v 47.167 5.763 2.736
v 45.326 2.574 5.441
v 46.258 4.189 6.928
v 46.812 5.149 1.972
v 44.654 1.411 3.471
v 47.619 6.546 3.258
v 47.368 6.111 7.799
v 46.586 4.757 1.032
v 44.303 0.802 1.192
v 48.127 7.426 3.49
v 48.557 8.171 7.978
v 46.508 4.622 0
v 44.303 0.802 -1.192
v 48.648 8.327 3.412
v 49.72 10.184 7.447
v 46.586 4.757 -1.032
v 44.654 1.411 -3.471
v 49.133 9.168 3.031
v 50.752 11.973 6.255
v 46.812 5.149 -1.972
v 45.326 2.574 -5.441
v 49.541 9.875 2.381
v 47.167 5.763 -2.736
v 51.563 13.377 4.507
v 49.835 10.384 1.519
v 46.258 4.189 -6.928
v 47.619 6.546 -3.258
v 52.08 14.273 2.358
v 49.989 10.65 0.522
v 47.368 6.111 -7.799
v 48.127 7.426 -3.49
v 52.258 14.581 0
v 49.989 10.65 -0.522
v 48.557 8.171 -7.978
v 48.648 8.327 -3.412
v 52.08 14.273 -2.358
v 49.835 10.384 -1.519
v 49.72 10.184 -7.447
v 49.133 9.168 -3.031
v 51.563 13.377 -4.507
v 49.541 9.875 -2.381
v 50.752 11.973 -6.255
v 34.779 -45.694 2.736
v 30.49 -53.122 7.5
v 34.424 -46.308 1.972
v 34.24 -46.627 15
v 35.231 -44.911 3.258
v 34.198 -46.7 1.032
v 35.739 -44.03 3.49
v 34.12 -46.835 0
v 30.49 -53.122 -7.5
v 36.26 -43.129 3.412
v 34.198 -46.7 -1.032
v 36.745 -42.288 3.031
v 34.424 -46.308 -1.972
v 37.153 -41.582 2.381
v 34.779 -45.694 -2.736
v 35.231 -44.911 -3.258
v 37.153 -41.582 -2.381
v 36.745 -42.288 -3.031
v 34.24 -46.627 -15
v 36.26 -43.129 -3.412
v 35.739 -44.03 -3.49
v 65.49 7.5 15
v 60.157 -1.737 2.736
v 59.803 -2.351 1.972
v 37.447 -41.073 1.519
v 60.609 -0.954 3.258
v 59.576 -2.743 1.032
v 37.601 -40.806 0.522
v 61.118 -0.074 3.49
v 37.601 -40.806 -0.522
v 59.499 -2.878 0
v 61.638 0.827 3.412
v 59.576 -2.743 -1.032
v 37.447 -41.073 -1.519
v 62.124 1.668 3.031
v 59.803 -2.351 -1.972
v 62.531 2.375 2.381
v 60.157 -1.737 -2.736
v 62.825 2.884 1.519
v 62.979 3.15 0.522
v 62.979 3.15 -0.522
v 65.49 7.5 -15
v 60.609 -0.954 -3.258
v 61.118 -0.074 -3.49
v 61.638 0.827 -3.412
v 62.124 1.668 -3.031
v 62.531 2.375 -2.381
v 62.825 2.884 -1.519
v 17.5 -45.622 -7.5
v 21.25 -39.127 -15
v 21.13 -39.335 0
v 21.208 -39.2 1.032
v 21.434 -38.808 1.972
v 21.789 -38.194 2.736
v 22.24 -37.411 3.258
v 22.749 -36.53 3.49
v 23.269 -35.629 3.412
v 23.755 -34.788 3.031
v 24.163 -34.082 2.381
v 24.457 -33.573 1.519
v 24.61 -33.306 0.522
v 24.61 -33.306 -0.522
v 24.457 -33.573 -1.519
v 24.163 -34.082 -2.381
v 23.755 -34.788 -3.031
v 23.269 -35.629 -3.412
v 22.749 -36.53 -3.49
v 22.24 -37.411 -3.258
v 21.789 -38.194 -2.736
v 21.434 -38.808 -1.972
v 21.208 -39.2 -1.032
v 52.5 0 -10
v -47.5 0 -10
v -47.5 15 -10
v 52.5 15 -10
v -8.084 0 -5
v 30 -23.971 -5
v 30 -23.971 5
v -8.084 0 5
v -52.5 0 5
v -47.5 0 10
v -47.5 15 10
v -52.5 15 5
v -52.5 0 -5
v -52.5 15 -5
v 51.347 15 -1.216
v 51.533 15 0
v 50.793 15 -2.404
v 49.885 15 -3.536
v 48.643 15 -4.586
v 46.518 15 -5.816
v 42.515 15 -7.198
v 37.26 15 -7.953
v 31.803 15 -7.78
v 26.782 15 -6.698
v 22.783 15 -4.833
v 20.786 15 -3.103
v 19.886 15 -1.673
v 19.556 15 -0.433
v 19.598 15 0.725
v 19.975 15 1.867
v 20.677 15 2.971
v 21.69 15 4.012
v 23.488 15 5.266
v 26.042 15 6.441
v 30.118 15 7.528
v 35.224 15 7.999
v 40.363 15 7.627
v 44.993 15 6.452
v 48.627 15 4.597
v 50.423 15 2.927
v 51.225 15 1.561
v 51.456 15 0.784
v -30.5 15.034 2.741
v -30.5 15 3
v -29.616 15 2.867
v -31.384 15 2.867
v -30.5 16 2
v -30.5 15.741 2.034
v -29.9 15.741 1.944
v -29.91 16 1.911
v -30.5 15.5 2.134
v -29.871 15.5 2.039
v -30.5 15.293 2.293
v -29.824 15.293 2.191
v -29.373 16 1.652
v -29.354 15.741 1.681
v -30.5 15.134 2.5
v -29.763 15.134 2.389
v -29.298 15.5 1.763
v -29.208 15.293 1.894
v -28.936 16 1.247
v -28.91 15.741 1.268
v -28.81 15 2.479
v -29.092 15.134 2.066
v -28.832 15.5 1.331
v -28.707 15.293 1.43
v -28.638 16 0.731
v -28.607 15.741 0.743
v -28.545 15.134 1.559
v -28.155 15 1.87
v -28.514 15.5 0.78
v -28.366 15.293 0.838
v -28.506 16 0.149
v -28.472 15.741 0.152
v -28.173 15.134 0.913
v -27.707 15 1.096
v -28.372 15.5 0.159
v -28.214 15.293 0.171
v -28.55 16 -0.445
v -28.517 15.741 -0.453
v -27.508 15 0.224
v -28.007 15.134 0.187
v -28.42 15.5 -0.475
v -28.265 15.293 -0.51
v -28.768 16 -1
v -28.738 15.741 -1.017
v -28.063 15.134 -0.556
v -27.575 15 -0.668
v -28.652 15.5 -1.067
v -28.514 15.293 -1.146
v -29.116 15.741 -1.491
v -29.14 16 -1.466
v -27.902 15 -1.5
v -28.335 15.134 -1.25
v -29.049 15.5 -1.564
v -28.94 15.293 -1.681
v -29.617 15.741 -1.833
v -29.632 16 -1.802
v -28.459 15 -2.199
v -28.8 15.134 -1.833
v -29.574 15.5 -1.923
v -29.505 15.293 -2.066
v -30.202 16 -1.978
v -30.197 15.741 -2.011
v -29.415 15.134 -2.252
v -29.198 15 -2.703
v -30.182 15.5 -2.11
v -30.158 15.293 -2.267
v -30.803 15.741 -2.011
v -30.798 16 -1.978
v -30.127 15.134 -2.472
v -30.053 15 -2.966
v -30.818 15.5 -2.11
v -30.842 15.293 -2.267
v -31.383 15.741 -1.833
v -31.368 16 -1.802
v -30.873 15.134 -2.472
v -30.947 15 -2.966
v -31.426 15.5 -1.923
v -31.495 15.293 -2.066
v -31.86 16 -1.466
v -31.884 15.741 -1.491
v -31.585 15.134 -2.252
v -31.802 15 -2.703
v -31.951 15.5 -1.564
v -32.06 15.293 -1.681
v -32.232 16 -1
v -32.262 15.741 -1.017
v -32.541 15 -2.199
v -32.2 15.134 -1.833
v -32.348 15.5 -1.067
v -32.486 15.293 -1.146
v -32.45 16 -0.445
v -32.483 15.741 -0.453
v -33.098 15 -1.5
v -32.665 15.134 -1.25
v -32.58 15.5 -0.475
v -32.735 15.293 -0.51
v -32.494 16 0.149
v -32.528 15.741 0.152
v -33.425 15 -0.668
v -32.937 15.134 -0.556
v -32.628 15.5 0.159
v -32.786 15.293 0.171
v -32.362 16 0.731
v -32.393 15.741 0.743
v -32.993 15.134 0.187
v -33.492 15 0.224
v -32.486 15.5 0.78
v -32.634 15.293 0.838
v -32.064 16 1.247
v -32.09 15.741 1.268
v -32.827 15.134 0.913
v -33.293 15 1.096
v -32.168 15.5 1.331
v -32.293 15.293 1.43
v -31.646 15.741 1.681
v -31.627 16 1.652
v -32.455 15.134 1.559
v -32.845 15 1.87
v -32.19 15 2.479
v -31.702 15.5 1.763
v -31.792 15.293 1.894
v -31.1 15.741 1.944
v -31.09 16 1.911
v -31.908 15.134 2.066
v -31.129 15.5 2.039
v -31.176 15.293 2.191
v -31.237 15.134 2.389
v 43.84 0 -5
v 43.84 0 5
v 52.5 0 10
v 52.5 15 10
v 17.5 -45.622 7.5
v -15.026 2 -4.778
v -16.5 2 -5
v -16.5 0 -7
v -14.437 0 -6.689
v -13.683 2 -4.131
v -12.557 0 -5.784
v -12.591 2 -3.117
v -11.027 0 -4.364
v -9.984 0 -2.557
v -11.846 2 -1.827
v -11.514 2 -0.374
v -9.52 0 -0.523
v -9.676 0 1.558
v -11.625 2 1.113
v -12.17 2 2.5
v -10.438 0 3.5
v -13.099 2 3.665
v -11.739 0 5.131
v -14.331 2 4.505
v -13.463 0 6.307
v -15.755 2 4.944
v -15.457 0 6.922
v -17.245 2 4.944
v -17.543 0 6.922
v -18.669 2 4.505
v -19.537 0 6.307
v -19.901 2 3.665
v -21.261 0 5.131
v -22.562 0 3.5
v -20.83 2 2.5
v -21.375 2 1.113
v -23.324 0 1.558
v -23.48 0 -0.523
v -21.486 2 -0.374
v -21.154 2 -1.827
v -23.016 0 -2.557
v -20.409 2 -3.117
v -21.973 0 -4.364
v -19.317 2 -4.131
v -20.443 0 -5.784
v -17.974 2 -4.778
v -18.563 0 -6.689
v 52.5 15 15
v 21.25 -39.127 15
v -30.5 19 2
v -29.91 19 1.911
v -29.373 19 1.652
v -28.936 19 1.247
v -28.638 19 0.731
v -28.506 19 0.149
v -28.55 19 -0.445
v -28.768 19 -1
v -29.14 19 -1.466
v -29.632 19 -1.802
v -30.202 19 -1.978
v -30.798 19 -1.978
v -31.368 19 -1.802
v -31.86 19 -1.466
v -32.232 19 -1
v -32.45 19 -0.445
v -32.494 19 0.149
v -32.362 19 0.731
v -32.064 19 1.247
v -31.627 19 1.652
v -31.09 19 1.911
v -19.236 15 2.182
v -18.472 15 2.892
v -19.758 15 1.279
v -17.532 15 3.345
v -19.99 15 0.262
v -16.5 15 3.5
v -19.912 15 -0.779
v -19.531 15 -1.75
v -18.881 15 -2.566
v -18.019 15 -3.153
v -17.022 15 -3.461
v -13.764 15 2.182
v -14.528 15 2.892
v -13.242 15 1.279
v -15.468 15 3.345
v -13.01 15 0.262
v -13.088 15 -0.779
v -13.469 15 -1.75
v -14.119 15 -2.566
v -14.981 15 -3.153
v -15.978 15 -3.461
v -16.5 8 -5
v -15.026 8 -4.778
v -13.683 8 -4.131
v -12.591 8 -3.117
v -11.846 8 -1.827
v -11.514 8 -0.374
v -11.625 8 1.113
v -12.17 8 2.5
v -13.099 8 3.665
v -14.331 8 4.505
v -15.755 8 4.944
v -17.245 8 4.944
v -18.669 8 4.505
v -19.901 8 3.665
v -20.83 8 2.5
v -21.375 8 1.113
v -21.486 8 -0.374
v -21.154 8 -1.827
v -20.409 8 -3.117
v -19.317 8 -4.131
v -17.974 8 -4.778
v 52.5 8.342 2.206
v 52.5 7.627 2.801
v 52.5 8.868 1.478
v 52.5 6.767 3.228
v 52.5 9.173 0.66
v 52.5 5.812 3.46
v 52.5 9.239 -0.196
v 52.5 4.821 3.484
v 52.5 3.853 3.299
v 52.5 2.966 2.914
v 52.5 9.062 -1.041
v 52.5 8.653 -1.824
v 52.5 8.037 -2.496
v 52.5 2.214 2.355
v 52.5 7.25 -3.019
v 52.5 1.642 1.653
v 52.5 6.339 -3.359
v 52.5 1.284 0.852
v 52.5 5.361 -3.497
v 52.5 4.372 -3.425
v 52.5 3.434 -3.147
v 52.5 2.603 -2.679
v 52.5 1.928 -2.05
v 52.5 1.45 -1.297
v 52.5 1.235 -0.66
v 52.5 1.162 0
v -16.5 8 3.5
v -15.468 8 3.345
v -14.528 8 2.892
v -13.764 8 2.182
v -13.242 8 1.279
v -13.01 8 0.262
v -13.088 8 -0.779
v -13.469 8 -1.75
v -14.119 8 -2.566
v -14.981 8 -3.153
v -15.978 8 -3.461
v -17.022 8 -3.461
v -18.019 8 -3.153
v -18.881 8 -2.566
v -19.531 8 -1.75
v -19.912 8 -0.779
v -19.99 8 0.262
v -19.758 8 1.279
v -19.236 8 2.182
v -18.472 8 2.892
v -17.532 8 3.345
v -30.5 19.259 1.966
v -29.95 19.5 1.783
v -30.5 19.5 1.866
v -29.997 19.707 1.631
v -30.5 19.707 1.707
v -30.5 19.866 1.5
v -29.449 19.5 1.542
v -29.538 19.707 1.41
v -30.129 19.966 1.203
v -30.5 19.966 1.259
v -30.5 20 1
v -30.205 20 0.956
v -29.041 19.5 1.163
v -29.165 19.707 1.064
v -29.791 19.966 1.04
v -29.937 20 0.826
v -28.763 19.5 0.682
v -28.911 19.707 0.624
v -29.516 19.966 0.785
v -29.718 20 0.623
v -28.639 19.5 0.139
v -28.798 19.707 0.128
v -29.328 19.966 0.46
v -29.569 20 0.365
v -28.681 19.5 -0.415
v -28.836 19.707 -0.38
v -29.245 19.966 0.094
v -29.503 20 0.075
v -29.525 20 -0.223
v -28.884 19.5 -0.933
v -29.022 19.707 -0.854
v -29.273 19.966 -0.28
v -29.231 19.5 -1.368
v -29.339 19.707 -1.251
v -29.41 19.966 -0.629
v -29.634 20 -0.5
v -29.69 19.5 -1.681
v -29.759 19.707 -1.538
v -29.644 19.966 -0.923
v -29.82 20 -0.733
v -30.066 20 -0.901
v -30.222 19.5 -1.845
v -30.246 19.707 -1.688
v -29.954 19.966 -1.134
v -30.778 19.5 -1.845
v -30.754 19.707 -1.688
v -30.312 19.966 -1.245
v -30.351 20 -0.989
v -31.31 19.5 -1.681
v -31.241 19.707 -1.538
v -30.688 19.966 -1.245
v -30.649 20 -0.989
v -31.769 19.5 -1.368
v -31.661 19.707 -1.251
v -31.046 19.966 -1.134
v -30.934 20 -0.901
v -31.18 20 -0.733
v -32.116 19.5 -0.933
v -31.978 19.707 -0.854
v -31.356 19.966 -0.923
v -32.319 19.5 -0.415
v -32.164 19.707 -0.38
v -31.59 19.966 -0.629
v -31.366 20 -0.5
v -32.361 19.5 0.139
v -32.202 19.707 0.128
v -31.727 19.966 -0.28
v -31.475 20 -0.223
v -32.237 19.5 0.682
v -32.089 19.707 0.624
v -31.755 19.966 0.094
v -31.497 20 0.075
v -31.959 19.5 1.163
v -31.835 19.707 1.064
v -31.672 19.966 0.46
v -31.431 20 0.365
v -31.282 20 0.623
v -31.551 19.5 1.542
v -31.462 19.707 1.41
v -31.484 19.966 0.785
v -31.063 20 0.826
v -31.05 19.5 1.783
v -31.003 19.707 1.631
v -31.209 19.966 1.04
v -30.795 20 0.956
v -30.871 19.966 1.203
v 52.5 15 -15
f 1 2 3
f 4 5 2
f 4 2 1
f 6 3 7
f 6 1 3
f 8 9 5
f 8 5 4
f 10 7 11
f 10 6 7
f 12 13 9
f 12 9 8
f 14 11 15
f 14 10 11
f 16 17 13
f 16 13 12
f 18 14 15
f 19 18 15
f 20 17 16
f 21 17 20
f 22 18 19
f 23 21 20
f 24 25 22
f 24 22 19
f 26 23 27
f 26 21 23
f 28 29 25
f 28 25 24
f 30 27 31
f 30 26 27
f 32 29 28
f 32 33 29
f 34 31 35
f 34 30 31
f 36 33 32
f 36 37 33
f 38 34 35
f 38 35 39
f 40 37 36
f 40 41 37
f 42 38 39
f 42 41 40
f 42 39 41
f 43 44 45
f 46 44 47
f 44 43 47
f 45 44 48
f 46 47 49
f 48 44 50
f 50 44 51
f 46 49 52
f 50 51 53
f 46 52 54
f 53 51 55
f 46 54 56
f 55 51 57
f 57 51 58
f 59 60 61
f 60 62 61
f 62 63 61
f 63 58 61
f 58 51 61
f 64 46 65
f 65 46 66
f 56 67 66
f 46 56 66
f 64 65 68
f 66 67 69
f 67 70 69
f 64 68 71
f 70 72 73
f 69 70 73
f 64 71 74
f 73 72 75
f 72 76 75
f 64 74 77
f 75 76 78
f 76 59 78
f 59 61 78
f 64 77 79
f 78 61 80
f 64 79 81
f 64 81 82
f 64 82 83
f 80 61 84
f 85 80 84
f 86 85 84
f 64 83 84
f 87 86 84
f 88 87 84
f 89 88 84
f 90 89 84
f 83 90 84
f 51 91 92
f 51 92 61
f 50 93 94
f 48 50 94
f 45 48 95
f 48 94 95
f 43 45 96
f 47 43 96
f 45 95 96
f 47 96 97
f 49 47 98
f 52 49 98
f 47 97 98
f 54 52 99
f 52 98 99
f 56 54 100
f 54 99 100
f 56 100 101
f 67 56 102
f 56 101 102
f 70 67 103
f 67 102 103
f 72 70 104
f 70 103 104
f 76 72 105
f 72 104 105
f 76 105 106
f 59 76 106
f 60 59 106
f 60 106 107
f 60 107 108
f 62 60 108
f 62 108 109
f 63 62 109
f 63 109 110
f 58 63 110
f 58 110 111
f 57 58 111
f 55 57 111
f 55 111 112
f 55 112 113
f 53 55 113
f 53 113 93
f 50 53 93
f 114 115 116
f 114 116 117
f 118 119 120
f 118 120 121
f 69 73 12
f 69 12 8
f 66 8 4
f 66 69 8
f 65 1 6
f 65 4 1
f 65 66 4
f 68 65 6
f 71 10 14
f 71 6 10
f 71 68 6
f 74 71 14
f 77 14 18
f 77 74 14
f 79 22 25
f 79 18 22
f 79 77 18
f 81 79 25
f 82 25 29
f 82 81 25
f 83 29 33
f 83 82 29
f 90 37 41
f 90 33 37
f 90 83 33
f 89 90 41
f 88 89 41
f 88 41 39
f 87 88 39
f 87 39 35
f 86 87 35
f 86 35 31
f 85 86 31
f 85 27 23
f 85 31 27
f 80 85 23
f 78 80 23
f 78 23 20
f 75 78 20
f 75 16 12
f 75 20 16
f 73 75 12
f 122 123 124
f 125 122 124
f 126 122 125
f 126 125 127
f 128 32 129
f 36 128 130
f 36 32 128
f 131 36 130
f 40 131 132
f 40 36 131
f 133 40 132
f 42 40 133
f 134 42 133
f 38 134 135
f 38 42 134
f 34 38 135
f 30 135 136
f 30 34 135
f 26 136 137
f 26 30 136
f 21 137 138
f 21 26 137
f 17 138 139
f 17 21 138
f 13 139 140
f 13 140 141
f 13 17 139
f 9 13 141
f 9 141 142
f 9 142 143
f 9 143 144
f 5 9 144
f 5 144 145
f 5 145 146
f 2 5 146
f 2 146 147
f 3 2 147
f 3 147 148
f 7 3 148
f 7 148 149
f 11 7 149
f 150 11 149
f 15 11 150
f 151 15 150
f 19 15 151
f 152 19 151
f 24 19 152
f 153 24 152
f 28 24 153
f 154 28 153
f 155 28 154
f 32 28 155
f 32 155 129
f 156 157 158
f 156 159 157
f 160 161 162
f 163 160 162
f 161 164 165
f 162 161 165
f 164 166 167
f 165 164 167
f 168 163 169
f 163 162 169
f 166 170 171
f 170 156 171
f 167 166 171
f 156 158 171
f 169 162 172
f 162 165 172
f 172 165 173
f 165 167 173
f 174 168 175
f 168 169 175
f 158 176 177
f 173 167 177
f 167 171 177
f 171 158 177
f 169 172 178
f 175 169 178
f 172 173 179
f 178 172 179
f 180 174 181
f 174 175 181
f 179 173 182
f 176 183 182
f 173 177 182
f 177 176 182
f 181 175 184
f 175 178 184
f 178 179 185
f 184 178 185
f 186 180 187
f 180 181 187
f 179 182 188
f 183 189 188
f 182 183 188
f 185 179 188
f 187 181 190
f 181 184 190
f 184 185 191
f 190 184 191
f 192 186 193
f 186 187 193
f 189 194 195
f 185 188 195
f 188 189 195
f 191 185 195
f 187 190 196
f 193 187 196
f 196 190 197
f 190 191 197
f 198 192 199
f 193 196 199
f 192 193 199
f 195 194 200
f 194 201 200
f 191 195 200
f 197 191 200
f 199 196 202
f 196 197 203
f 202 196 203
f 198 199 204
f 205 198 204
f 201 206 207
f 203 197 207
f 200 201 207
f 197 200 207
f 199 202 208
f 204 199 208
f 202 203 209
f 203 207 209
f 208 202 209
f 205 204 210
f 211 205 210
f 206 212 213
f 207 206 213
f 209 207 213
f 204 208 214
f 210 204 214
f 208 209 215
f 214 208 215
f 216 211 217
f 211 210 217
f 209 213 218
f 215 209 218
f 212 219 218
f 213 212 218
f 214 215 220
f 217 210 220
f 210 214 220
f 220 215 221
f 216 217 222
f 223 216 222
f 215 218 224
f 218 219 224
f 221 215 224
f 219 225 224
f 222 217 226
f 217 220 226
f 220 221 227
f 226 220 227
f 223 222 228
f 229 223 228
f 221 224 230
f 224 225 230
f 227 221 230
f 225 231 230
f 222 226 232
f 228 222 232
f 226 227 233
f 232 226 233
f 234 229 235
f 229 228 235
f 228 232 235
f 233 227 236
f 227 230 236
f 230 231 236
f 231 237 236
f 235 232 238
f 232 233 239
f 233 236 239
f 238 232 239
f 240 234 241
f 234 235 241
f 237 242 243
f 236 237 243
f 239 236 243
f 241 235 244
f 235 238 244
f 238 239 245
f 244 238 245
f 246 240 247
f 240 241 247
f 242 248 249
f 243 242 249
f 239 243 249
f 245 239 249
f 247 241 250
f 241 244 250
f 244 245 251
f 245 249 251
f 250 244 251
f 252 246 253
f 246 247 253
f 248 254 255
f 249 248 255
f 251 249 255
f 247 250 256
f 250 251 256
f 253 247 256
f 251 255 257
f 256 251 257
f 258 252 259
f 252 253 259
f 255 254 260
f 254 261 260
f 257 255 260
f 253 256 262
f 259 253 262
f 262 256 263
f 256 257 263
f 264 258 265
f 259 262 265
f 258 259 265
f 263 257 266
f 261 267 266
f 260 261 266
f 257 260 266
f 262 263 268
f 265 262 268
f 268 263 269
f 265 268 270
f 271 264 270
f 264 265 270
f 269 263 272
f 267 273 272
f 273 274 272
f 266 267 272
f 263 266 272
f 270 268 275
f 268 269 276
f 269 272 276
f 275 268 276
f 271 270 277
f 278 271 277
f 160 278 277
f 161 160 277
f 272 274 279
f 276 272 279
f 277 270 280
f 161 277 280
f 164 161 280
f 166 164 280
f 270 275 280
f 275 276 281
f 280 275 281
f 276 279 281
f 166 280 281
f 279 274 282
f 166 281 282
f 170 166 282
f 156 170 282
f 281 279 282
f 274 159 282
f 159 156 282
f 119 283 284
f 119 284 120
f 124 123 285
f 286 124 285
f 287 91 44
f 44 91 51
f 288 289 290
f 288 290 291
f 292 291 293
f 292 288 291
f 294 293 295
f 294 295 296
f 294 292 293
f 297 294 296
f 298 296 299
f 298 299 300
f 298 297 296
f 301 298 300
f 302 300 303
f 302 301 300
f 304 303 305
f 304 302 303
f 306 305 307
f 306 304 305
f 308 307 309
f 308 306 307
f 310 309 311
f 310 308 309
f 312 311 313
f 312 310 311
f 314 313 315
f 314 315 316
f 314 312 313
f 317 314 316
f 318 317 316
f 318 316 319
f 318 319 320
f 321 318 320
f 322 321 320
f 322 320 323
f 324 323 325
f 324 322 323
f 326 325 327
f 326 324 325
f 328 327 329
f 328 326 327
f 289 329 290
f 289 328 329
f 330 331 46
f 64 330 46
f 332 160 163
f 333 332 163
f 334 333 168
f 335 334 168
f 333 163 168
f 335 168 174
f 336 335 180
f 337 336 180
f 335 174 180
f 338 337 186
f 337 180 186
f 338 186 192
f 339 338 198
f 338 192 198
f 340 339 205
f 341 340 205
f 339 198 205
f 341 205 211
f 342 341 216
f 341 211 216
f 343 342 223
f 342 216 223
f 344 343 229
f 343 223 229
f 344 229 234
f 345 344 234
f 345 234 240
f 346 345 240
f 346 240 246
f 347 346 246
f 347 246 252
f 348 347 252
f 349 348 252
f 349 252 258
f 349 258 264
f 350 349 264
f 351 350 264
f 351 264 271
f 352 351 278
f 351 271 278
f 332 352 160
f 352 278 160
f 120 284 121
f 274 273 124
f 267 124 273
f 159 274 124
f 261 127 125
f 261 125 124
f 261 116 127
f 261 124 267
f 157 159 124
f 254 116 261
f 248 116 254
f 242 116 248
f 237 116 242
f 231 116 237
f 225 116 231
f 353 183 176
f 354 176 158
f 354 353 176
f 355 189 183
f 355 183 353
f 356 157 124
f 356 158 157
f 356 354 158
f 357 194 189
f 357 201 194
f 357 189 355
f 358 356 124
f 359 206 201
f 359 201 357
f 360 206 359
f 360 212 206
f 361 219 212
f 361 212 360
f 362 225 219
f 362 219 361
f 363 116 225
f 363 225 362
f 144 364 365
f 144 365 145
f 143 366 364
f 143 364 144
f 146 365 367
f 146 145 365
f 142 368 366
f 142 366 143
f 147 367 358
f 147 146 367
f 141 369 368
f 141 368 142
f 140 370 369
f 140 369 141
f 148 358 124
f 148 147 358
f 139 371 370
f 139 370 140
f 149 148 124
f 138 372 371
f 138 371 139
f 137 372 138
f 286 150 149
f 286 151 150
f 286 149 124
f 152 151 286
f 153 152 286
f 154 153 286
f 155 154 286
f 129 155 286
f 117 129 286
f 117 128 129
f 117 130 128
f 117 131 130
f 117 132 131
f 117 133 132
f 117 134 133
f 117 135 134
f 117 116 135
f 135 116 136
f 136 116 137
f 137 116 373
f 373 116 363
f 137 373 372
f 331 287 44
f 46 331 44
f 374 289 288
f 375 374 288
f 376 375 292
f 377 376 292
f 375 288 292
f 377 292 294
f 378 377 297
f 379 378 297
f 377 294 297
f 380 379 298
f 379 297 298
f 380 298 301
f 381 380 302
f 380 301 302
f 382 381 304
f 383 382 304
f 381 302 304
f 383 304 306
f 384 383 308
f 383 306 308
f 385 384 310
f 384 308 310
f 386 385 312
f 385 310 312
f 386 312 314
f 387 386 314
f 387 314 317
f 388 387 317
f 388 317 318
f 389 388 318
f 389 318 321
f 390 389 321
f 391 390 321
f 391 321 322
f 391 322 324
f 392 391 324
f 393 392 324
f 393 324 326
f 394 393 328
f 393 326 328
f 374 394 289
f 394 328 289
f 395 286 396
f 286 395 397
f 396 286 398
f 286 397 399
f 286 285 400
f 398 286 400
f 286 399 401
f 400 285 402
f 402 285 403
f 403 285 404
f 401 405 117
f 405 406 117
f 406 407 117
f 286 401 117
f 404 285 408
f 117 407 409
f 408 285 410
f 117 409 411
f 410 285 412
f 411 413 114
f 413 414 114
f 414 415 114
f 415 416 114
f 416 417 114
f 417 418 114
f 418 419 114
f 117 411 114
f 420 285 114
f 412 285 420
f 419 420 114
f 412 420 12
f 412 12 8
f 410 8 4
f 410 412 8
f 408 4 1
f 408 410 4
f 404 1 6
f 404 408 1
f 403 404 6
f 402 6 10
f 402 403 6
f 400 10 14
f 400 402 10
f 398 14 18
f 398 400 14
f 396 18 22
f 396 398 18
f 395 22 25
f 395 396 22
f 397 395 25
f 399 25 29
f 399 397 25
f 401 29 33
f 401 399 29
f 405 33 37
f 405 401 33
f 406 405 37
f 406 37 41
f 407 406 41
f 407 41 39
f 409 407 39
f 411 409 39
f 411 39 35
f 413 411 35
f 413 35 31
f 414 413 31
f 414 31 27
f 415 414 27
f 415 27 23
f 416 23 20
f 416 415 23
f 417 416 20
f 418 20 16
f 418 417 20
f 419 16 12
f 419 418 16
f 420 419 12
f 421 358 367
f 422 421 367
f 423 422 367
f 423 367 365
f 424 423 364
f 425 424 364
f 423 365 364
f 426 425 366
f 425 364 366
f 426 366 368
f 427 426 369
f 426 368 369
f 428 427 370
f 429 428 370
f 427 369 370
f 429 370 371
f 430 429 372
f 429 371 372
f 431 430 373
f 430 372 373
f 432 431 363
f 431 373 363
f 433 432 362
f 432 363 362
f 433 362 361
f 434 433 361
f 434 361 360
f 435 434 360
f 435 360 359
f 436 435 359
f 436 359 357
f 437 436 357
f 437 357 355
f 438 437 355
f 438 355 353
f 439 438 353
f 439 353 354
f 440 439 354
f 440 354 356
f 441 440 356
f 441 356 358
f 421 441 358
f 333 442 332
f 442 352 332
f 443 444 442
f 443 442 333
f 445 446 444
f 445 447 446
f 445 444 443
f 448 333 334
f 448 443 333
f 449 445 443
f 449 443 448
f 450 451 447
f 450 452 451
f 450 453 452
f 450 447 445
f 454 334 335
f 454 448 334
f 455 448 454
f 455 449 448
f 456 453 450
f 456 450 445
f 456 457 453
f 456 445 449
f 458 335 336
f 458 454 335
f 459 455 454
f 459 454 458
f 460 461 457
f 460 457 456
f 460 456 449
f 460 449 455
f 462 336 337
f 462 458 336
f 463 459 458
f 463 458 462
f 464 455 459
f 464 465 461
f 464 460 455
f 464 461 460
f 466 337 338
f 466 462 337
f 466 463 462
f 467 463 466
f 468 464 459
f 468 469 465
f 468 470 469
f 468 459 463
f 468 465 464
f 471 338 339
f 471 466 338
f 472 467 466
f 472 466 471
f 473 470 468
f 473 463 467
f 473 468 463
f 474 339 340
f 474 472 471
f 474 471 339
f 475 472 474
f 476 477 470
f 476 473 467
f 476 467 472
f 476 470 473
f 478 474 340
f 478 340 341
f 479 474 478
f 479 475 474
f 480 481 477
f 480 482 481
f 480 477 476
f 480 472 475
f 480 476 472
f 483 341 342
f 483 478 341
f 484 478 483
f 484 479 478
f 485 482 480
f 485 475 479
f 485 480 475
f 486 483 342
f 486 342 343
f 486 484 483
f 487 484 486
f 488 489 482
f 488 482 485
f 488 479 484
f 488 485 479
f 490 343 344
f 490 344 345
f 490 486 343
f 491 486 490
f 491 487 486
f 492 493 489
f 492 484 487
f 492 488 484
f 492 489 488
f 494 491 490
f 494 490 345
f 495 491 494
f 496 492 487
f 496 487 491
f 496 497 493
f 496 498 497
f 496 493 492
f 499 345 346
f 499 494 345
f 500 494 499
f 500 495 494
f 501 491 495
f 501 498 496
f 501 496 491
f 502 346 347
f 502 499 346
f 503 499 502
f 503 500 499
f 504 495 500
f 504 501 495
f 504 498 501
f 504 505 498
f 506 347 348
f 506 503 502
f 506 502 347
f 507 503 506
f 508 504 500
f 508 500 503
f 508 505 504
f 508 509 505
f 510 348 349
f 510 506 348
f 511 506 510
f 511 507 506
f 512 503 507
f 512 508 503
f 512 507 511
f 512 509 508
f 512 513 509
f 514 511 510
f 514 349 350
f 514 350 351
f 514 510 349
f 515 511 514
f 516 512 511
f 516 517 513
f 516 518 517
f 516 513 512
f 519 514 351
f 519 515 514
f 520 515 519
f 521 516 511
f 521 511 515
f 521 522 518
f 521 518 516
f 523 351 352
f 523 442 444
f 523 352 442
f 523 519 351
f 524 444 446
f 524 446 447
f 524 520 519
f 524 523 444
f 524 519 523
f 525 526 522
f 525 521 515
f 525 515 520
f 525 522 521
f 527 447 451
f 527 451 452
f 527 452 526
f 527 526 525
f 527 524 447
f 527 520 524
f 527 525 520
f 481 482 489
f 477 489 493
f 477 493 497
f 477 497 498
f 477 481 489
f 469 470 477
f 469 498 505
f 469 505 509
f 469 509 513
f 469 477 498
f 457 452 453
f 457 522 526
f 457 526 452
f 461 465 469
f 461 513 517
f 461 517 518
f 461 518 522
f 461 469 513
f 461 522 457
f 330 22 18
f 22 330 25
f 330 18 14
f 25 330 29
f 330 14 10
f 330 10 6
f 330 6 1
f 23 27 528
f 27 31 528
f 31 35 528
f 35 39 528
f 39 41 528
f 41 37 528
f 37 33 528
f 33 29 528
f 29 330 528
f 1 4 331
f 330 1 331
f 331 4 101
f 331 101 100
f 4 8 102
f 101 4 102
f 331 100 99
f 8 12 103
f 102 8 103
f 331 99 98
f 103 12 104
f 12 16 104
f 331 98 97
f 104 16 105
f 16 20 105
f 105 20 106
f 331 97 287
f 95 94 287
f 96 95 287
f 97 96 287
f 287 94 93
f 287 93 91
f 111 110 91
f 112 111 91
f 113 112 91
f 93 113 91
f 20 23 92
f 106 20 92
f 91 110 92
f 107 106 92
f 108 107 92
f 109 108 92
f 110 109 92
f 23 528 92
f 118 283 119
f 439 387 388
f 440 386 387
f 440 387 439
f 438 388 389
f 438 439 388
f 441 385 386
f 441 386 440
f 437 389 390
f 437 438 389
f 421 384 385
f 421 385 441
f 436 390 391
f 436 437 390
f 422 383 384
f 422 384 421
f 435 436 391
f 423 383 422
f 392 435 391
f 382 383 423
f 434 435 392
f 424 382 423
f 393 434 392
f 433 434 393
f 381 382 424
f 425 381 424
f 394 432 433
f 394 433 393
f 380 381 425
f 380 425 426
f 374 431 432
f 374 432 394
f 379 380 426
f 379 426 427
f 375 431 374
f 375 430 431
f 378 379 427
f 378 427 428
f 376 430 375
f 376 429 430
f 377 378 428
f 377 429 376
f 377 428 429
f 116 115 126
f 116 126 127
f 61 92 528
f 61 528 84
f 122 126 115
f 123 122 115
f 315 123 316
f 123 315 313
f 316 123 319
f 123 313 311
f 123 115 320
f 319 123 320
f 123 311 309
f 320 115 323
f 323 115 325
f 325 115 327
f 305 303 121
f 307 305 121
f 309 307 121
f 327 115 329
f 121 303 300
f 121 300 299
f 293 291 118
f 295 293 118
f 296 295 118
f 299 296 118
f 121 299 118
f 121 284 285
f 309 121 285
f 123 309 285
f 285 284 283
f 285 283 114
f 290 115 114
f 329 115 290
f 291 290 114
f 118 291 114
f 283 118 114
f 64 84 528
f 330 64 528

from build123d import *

# Parameters (mm, degrees)
SKETCH1_W                = 105
SKETCH1_H                = 20
BOSS_EXTRUDE1_DEPTH      = 15
SKETCH2_R                = 3.5
CUT_EXTRUDE1_DEPTH       = 15
SKETCH3_R                = 2
BOSS_EXTRUDE2_DEPTH      = 5
SKETCH4_R                = 5
CUT_EXTRUDE2_DEPTH       = 8
BOSS_EXTRUDE3_DEPTH      = 15
BOSS_EXTRUDE3_DEPTH_BACK = 15
BOSS_EXTRUDE4_DEPTH      = 5
BOSS_EXTRUDE4_DEPTH_BACK = 5
SKETCH8_R                = 3.5
CUT_EXTRUDE3_DEPTH       = 96.049456406
CHAMFER2_SIZE            = 7.5
FILLET8_R                = 1
FILLET9_R                = 1
CHAMFER4_SIZE            = 2
CHAMFER5_SIZE            = 5
CUT_EXTRUDE4_DEPTH       = 96.049456406
CUT_EXTRUDE4_DEPTH_BACK  = 96.049456406
SKETCH9_R                = 3.5
SKETCH11_R               = 8
CUT_EXTRUDE5_DEPTH       = 30


with BuildPart() as part:
    # Sketch1 → Boss-Extrude1 (new body)
    with BuildSketch(Plane(origin=(0, 0, 0), x_dir=(1, 0, 0), z_dir=(0, 1, 0))):
        Rectangle(SKETCH1_W, SKETCH1_H)
    extrude(amount=BOSS_EXTRUDE1_DEPTH)

    # Sketch2 → Cut-Extrude1 (cut)
    with BuildSketch(Plane(origin=(0, 15, 0), x_dir=(1, 0, 0), z_dir=(0, 1, 0))):
        with Locations(Location((-16.5, 0, 0), (0, 0, 270))):
            Circle(SKETCH2_R)
    extrude(amount=-CUT_EXTRUDE1_DEPTH, mode=Mode.SUBTRACT)

    # Sketch3 → Boss-Extrude2 (add)
    with BuildSketch(Plane(origin=(0, 15, 0), x_dir=(1, 0, 0), z_dir=(0, 1, 0))):
        with Locations(Location((-30.5, 0, 0), (0, 0, 270))):
            Circle(SKETCH3_R)
    extrude(amount=BOSS_EXTRUDE2_DEPTH)

    # Sketch4 → Cut-Extrude2 (cut)
    with BuildSketch(Plane.XZ):
        with Locations(Location((-16.5, 0, 0), (0, 0, 270))):
            Circle(SKETCH4_R)
    extrude(amount=-CUT_EXTRUDE2_DEPTH, mode=Mode.SUBTRACT)

    # Sketch7 → Boss-Extrude4 (add, two sides: drawn at the far end of the back side and taken through both)
    with BuildSketch(Plane.XY.offset(-BOSS_EXTRUDE4_DEPTH_BACK)):
        Polygon((-8.083911237, 0), (43.839745962, 0), (30, -23.97114317), align=None)
    extrude(amount=BOSS_EXTRUDE4_DEPTH + BOSS_EXTRUDE4_DEPTH_BACK)

    # Fillet8
    fillet8_edges = [part.edges().sort_by_distance(p)[0] for p in [
        (-30.5, 20, -2),
    ]]
    fillet(fillet8_edges, radius=FILLET8_R)

    # Fillet9
    fillet9_edges = [part.edges().sort_by_distance(p)[0] for p in [
        (-30.5, 15, -2),
    ]]
    fillet(fillet9_edges, radius=FILLET9_R)

    # Chamfer4
    chamfer4_edges = [part.edges().sort_by_distance(p)[0] for p in [
        (-16.5, 0, 5),
    ]]
    chamfer(chamfer4_edges, length=CHAMFER4_SIZE)

    # Chamfer5
    chamfer5_edges = [part.edges().sort_by_distance(p)[0] for p in [
        (-52.5, 7.5, -10),
        (-52.5, 7.5, 10),
    ]]
    chamfer(chamfer5_edges, length=CHAMFER5_SIZE)


with BuildPart() as body_2:
    # Sketch5 → Boss-Extrude3 (new, two sides: drawn at the far end of the back side and taken through both)
    with BuildSketch(Plane.XY.offset(-BOSS_EXTRUDE3_DEPTH_BACK)):
        Polygon((52.5, 15), (17.5, -45.621778265), (30.490381057, -53.121778265), (65.490381057, 7.5), align=None)
    extrude(amount=BOSS_EXTRUDE3_DEPTH + BOSS_EXTRUDE3_DEPTH_BACK)

    # Sketch8 → Cut-Extrude3 (cut, through all)
    with BuildSketch(Plane(origin=(32.879809472, -18.983166849, 0), x_dir=(0, 0, 1), z_dir=(-0.8660254037844382, 0.500000000000001, 0))):
        with Locations(Location((0, -20, 0), (0, 0, 270))):
            Circle(SKETCH8_R)
    extrude(amount=-CUT_EXTRUDE3_DEPTH, mode=Mode.SUBTRACT)

    # Chamfer2
    chamfer2_edges = [body_2.edges().sort_by_distance(p)[0] for p in [
        (23.995190528, -49.371778265, -15),
        (23.995190528, -49.371778265, 15),
    ]]
    chamfer(chamfer2_edges, length=CHAMFER2_SIZE)


with BuildPart() as cut_extrude4_tool:
    # Sketch9 → Cut-Extrude4 (new, two sides: drawn at the far end of the back side and taken through both)
    with BuildSketch(Plane(origin=(32.879809472, -18.983166849, 0), x_dir=(0, 0, 1), z_dir=(-0.8660254037844382, 0.500000000000001, 0)).offset(-CUT_EXTRUDE4_DEPTH_BACK)):
        with Locations(Location((0, 30.756735111, 0), (0, 0, 270))):
            Circle(SKETCH9_R)
    extrude(amount=CUT_EXTRUDE4_DEPTH + CUT_EXTRUDE4_DEPTH_BACK)


with BuildPart() as part_1:
    add(part.part)

    # Cut-Extrude4: cut by cut_extrude4_tool
    add(cut_extrude4_tool.part, mode=Mode.SUBTRACT)

    # Sketch11 → Cut-Extrude5 (cut)
    with BuildSketch(Plane(origin=(32.879809472, -18.983166849, 0), x_dir=(0, 0, 1), z_dir=(-0.8660254037844382, 0.500000000000001, 0))):
        with Locations(Location((0, 30.756735111, 0), (0, 0, 90))):
            Circle(SKETCH11_R)
    extrude(amount=CUT_EXTRUDE5_DEPTH, mode=Mode.SUBTRACT)


with BuildPart() as body_2_1:
    add(body_2.part)

    # Cut-Extrude4: cut by cut_extrude4_tool
    add(cut_extrude4_tool.part, mode=Mode.SUBTRACT)


solid = Compound([part_1.part, body_2_1.part])
